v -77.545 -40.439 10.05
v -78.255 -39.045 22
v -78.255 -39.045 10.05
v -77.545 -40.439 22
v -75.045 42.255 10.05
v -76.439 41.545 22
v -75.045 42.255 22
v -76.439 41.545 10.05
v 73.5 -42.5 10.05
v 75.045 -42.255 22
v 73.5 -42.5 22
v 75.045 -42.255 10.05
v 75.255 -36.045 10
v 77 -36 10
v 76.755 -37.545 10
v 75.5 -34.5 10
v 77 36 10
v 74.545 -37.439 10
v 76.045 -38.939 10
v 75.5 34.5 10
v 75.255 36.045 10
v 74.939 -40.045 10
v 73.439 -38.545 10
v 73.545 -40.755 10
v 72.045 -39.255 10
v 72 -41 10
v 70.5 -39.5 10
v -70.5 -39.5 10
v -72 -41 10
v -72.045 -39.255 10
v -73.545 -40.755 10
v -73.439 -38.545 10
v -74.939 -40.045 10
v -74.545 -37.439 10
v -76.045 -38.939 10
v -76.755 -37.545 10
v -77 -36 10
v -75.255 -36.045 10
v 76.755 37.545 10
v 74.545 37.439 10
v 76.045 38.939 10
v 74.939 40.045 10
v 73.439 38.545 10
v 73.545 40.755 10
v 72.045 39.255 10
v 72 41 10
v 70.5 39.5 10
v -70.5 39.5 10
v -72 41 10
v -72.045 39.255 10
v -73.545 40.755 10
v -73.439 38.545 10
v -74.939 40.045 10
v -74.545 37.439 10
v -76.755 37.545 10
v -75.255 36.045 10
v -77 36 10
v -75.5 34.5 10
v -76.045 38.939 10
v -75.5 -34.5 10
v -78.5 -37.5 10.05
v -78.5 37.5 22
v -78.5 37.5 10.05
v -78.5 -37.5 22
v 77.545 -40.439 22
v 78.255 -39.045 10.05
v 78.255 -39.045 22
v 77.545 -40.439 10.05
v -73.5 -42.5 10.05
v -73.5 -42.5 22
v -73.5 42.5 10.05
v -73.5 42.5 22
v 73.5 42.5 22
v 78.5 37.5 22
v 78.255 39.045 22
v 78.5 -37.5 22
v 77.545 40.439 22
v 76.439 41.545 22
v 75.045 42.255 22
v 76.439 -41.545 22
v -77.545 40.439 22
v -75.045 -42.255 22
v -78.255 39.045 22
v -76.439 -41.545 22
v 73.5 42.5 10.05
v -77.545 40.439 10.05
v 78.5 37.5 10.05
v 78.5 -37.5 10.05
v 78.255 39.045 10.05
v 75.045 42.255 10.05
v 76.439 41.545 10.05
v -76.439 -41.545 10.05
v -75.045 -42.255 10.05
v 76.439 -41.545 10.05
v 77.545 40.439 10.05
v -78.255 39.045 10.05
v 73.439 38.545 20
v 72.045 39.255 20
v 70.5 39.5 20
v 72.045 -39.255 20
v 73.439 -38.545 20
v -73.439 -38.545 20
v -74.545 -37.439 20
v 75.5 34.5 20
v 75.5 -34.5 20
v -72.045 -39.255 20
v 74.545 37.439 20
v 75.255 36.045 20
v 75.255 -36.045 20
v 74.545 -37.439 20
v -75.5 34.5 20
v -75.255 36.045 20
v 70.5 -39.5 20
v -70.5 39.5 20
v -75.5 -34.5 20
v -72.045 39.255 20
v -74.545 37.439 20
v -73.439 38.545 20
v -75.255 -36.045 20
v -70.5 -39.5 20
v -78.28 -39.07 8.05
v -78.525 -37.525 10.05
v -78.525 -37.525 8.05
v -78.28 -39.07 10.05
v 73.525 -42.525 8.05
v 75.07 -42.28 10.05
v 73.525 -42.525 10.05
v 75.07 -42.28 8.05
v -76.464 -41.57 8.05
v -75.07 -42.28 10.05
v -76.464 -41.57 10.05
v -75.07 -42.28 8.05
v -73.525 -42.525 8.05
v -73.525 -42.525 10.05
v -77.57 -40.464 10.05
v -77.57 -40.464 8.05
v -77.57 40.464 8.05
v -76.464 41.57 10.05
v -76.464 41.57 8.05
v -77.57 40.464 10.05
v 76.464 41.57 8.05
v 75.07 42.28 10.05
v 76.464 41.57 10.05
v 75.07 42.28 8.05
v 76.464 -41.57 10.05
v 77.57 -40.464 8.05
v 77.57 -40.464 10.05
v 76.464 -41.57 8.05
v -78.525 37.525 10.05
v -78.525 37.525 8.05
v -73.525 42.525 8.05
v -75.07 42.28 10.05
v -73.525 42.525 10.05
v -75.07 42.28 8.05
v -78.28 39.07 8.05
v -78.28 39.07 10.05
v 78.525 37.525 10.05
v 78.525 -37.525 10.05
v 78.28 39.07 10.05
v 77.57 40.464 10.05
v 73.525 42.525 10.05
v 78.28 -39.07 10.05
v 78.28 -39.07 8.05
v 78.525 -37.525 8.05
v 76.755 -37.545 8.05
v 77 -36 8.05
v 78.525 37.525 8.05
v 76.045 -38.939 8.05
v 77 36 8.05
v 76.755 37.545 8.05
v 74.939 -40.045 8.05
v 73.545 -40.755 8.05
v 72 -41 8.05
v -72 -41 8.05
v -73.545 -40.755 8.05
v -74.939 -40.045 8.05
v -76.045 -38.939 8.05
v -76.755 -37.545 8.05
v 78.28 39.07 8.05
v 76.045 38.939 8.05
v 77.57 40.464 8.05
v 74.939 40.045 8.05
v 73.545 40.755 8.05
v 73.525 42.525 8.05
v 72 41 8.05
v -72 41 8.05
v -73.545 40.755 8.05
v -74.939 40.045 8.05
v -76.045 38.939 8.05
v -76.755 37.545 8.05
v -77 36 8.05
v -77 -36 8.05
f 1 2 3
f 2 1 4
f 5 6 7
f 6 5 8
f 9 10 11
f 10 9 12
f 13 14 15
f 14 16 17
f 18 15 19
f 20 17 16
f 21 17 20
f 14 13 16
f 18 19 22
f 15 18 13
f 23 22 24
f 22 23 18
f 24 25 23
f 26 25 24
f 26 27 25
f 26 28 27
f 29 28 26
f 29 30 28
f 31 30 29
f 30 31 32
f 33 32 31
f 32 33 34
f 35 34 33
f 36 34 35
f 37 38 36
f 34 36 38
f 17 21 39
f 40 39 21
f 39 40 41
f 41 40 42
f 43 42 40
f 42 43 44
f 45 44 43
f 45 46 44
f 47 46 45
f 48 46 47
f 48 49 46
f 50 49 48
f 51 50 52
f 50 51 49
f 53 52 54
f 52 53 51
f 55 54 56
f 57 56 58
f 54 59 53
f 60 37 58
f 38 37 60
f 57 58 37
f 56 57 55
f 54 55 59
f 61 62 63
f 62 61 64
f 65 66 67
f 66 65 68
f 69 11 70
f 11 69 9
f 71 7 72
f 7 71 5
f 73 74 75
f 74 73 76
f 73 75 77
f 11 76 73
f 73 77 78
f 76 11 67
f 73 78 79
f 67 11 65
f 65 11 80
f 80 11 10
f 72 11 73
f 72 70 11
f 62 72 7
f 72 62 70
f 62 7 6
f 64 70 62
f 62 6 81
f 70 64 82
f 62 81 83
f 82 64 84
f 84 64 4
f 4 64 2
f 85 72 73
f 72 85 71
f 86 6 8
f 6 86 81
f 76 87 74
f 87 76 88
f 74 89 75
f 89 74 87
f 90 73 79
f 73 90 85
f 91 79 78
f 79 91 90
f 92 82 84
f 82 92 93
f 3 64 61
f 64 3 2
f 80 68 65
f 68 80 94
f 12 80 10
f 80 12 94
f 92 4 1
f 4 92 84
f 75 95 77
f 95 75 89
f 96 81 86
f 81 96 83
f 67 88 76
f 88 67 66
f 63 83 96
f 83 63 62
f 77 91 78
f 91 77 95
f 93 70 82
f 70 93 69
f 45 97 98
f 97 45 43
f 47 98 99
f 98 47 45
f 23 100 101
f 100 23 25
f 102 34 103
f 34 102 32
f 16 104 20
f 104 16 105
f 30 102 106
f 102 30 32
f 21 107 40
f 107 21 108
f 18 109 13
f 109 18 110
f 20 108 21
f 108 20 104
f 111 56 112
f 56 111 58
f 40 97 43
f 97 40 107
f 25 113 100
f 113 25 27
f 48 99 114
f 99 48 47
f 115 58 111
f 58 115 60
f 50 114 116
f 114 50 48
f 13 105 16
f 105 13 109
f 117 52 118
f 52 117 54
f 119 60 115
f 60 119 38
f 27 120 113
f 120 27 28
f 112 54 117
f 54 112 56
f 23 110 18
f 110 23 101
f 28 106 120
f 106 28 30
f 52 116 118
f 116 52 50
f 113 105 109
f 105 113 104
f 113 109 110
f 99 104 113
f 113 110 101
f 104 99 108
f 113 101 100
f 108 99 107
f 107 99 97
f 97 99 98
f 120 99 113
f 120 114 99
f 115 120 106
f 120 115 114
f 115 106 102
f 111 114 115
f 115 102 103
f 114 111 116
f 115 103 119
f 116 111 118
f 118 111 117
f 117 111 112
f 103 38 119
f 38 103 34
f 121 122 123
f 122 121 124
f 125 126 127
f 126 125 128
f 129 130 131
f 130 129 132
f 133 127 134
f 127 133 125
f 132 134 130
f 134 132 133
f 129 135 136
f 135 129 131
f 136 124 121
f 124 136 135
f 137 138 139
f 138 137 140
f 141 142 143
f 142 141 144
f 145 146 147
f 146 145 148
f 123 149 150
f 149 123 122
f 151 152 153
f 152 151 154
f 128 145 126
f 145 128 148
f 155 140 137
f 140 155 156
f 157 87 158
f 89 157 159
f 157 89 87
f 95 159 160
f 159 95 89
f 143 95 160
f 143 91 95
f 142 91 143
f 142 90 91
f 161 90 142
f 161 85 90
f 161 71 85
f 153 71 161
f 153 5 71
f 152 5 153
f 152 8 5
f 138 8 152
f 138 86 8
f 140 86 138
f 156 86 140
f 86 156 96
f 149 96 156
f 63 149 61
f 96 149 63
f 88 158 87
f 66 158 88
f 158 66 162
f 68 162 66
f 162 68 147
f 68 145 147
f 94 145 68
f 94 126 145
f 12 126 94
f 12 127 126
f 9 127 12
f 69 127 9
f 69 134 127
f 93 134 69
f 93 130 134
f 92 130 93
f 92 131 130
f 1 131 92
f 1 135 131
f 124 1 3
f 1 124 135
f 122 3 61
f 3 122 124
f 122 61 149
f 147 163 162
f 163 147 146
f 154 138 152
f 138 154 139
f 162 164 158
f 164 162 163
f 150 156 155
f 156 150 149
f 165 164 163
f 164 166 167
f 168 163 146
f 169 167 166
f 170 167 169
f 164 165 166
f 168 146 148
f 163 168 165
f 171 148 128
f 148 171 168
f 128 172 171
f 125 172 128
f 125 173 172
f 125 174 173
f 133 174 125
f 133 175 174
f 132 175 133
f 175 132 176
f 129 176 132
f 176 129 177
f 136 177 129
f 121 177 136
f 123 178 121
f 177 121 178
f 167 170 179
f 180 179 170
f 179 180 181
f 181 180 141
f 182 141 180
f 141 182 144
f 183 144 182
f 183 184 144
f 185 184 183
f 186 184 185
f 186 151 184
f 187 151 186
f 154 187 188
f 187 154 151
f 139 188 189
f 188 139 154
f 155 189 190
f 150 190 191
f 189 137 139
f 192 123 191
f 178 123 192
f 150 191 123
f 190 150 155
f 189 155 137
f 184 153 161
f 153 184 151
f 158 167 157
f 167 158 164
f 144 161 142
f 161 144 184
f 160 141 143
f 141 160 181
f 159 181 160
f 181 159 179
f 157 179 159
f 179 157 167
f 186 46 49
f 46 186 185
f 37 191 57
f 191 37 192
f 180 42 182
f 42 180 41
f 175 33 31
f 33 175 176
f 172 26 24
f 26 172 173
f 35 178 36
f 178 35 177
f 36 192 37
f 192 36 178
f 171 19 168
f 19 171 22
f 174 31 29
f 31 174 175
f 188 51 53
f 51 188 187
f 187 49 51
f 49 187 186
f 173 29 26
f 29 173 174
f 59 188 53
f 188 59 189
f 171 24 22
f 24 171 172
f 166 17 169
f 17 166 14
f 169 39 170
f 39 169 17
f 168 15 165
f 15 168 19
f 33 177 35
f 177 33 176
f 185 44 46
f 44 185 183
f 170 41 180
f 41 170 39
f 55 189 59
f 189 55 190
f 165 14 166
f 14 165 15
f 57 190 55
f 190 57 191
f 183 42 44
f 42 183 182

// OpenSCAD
// file: lcd_case.scad
// LCD case parameters
// Author: Gerhard Gappmeier <gappy1502@gmx.net>

// screws: M3
screw_diam=3;
nut_diam=5.5;
nut_height=3;
delta=0.1; // make it a little bigger
// case size
WIDTH=157; // x-dir
HEIGHT=85; // y-dir
DEPTH=22;  // z-dir
BOTTOM_WALL_THICKNESS=2;
TOP_WALL_THICKNESS=2;
BOTTOM_HEIGHT=10;
PCB_MOUNT_HEIGHT=5; // + BOTTOM_WALL_THICKNESS
TOP_HEIGHT=DEPTH-BOTTOM_HEIGHT;
ETA=0.05;
$fn=20;
// radius for rounded corners
ROUNDED_RADIUS=5;
border_height=2;
// MAIN PCB
PCB_WIDTH=150;
PCB_HEIGHT=55.3;
PCB_OFFSET_Y=0;
PCB_THICKNESS=1.8;
PCB_HOLE_RAD=1.5;
PCB_HOLE_OFFSET=2.5;
// LCD PCB
LCD_PCB_WIDTH=98.4;
LCD_PCB_HEIGHT=60;
LCD_PCB_HOLE_RAD=1.8;
LCD_PCB_HOLE_OFFSET=2.7;
LCD_PCB_OFFSET_X=13.4;
LCD_PCB_OFFSET_Y=3;

// LCD cutout size and offset
LCD_WIDTH=97.2;
LCD_HEIGHT=39.9;
LCD_THICKNESS=10;
LCD_OFFSET_X=0.8;
LCD_OFFSET_Y=10.2;

// set to 1 for explode view, 0 otherwise
explode=1;
show_top=1;
show_bottom=1;
// set to 1 to display LCD and PCB, 0 otherwise
show_lcd=1;

// note: The case and the main PCB are centered.
// the LCD PCB and LCD are relative to the main PCB

// rounded cube: x/y centered, z_bottom=0
module rounded_cube(w, h, d) {
    hull() {
        translate([-w/2+ROUNDED_RADIUS, -h/2+ROUNDED_RADIUS, 0]) cylinder(d, r=ROUNDED_RADIUS, center=false);
        translate([w/2-ROUNDED_RADIUS, -h/2+ROUNDED_RADIUS, 0]) cylinder(d, r=ROUNDED_RADIUS, center=false);
        translate([-w/2+ROUNDED_RADIUS, h/2-ROUNDED_RADIUS, 0]) cylinder(d, r=ROUNDED_RADIUS, center=false);
        translate([w/2-ROUNDED_RADIUS, h/2-ROUNDED_RADIUS, 0]) cylinder(d, r=ROUNDED_RADIUS, center=false);
    }
}

// rounded cube: x/y/z centered
module nut_trap(w = 5.5, h = 3) {
    cylinder(r = w / 2 / cos(180 / 6) + delta, h=h+2*delta, $fn=6, center=true);
}

// nut trap cube: x/y centered, z_bottom=0
module nut_trap_cube(W=10, H=6) {
    translate([0,0,H/2]) difference() {
        cube([W,W,H], center=true);
        union() {
            translate([0,-W/2,0]) cube([nut_diam+2*delta,W,nut_height+2*delta], center=true);
            rotate([0,0,30]) nut_trap(nut_diam, nut_height);
        }
        cylinder(H+2*ETA,d=screw_diam+delta, center=true);
    }
}

module bottom_border() {
    difference() {
        rounded_cube(WIDTH+ETA, HEIGHT+ETA, border_height);
        translate([0,0,-ETA]) rounded_cube(WIDTH-3, HEIGHT-3, border_height+2*ETA);
    }
}

module bottom() {

    union() {
        difference() {
            rounded_cube(WIDTH, HEIGHT, BOTTOM_HEIGHT);
            translate([0,0,BOTTOM_WALL_THICKNESS]) rounded_cube(WIDTH-6, HEIGHT-6, BOTTOM_HEIGHT);
            translate([0,0,BOTTOM_HEIGHT-border_height+ETA]) bottom_border();
            // sd card cutout
            cutoff_depth=3+ETA;
            translate([-WIDTH/2,0,BOTTOM_WALL_THICKNESS+PCB_MOUNT_HEIGHT+cutoff_depth/2]) cube([20,25,cutoff_depth], center=true);
        }
        // PCB mounting nut traps
        xoff=PCB_WIDTH/2-PCB_HOLE_OFFSET;
        yoff=PCB_HEIGHT/2-PCB_HOLE_OFFSET;
        translate([0,PCB_OFFSET_Y,BOTTOM_WALL_THICKNESS]) {
            translate([-xoff,-yoff,0]) rotate([0,0,90]) nut_trap_cube(10, PCB_MOUNT_HEIGHT);
            translate([ xoff,-yoff,0]) rotate([0,0,-90]) nut_trap_cube(10, PCB_MOUNT_HEIGHT);
            translate([-xoff, yoff,0]) rotate([0,0,90]) nut_trap_cube(10, PCB_MOUNT_HEIGHT);
            translate([ xoff, yoff,0]) rotate([0,0,-90]) nut_trap_cube(10, PCB_MOUNT_HEIGHT);
        }
        // TOP mounting nut traps
        xoff2=WIDTH/2-15;
        yoff2=HEIGHT/2-7;
        translate([0,PCB_OFFSET_Y,BOTTOM_WALL_THICKNESS]) {
            translate([-xoff2,-yoff2,0]) rotate([0,0,180]) nut_trap_cube(10, PCB_MOUNT_HEIGHT);
            translate([ xoff2,-yoff2,0]) rotate([0,0,180]) nut_trap_cube(10, PCB_MOUNT_HEIGHT);
            translate([-xoff2, yoff2,0]) rotate([0,0,0]) nut_trap_cube(10, PCB_MOUNT_HEIGHT);
            translate([ xoff2, yoff2,0]) rotate([0,0,0]) nut_trap_cube(10, PCB_MOUNT_HEIGHT);
        }
    }
}

module top() {
    translate([0,0,BOTTOM_HEIGHT]) union() {
        difference() {
            rounded_cube(WIDTH, HEIGHT, TOP_HEIGHT);
            translate([0,0,-BOTTOM_WALL_THICKNESS]) rounded_cube(WIDTH-6, HEIGHT-6, TOP_HEIGHT);
        }
        translate([0,0,-border_height+ETA]) bottom_border();
    }
}

// same as cube, but x/y centered, z_bottom=0
module pcb(w,h,d) {
    translate([0,0,d/2]) cube([w,h,d], center=true);
}

function main_pcb_z_offset() = BOTTOM_WALL_THICKNESS+PCB_MOUNT_HEIGHT+ETA;

module main_pcb() {
    xoff=PCB_WIDTH/2-PCB_HOLE_OFFSET;
    yoff=PCB_HEIGHT/2-PCB_HOLE_OFFSET;
    zoff=main_pcb_z_offset();
    color("red") translate([0,0,zoff]) difference() {
        pcb(PCB_WIDTH, PCB_HEIGHT, PCB_THICKNESS);
        translate([-xoff, -yoff, -ETA]) cylinder(PCB_THICKNESS+2*ETA, r=PCB_HOLE_RAD, center=false);
        translate([xoff, -yoff, -ETA]) cylinder(PCB_THICKNESS+2*ETA, r=PCB_HOLE_RAD, center=false);
        translate([-xoff, yoff, -ETA]) cylinder(PCB_THICKNESS+2*ETA, r=PCB_HOLE_RAD, center=false);
        translate([xoff, yoff, -ETA]) cylinder(PCB_THICKNESS+2*ETA, r=PCB_HOLE_RAD, center=false);
    }
    // beeper
    color("gray") translate([PCB_WIDTH/2-13,PCB_HEIGHT/2-10,zoff+PCB_THICKNESS]) cylinder(9.3,r=6,center=false);
    // poti
    color("gray") translate([PCB_WIDTH/2-13,PCB_HEIGHT/2-30,zoff+PCB_THICKNESS]) {
        pcb(12,12,4.2);
        translate([0,0,4.2]) cylinder(25,d=6.1,center=false);
    }
    // reset button
    color("gray") translate([PCB_WIDTH/2-13,PCB_HEIGHT/2-47,zoff+PCB_THICKNESS]) {
        pcb(6,6,4);
        translate([0,0,4]) cylinder(1.5,d=3.5,center=false);
    }
    // connector
    color("gray") translate([-PCB_WIDTH/2+45,PCB_HEIGHT/2-22,zoff-9]) {
        pcb(21,9,9);
    }
    color("gray") translate([-PCB_WIDTH/2+68,PCB_HEIGHT/2-22,zoff-9]) {
        pcb(21,9,9);
    }

}

function lcd_pcb_z_offset() = main_pcb_z_offset() + PCB_THICKNESS + 2.5 + ETA;

module lcd_pcb() {
    xoff=(LCD_PCB_WIDTH-PCB_WIDTH)/2+LCD_PCB_OFFSET_X;
    yoff=(PCB_HEIGHT-LCD_PCB_HEIGHT)/2-LCD_PCB_OFFSET_Y;
    zoff=lcd_pcb_z_offset();
    hole_xoff=LCD_PCB_WIDTH/2-LCD_PCB_HOLE_OFFSET;
    hole_yoff=LCD_PCB_HEIGHT/2-LCD_PCB_HOLE_OFFSET;

    color("green") translate([xoff,yoff,zoff]) difference() {
        pcb(LCD_PCB_WIDTH, LCD_PCB_HEIGHT, PCB_THICKNESS);
        translate([-hole_xoff, -hole_yoff, -ETA]) cylinder(PCB_THICKNESS+2*ETA, r=LCD_PCB_HOLE_RAD, center=false);
        translate([ hole_xoff, -hole_yoff, -ETA]) cylinder(PCB_THICKNESS+2*ETA, r=LCD_PCB_HOLE_RAD, center=false);
        translate([-hole_xoff,  hole_yoff, -ETA]) cylinder(PCB_THICKNESS+2*ETA, r=LCD_PCB_HOLE_RAD, center=false);
        translate([ hole_xoff,  hole_yoff, -ETA]) cylinder(PCB_THICKNESS+2*ETA, r=LCD_PCB_HOLE_RAD, center=false);
    }

    color("black") translate([-30,21.25,zoff-2.5]) pcb(40.6,2.5,2.5);
}

// the LCD module
function lcd_z_offset() = lcd_pcb_z_offset() + PCB_THICKNESS + ETA;
module lcd() {
    xoff=(LCD_WIDTH-PCB_WIDTH)/2+LCD_PCB_OFFSET_X+LCD_OFFSET_X;
    yoff=(PCB_HEIGHT-LCD_HEIGHT)/2-LCD_PCB_OFFSET_Y-LCD_OFFSET_Y;
    zoff=lcd_z_offset();
    color("gray") translate([xoff,yoff,zoff]) pcb(LCD_WIDTH, LCD_HEIGHT, LCD_THICKNESS);
}

// complete LCD display including PCB
module lcd_display() {
    main_pcb();
    lcd_pcb();
    lcd();
}

// bottom part
if (show_bottom) {
    /*intersection() {*/
        translate([0,0,-explode*30]) difference() {
            bottom();
            translate([0,PCB_OFFSET_Y,0]) lcd_display();
        }
    /*    translate([-WIDTH/2,-HEIGHT/2,0]) cube([50,50,50], center=true);
    }*/
}

// top part
if (show_top) {
    translate([0,0,explode*30]) difference() {
        top();
        translate([0,PCB_OFFSET_Y,0]) lcd_display();
    }
}

// LCD display
if (show_lcd) {
    translate([0,PCB_OFFSET_Y,0]) lcd_display();
}

//translate([0,0,20]) nut_trap_cube();
// main file
/* helper file for creating top.stl */
use <lcd_case.scad>
top();
